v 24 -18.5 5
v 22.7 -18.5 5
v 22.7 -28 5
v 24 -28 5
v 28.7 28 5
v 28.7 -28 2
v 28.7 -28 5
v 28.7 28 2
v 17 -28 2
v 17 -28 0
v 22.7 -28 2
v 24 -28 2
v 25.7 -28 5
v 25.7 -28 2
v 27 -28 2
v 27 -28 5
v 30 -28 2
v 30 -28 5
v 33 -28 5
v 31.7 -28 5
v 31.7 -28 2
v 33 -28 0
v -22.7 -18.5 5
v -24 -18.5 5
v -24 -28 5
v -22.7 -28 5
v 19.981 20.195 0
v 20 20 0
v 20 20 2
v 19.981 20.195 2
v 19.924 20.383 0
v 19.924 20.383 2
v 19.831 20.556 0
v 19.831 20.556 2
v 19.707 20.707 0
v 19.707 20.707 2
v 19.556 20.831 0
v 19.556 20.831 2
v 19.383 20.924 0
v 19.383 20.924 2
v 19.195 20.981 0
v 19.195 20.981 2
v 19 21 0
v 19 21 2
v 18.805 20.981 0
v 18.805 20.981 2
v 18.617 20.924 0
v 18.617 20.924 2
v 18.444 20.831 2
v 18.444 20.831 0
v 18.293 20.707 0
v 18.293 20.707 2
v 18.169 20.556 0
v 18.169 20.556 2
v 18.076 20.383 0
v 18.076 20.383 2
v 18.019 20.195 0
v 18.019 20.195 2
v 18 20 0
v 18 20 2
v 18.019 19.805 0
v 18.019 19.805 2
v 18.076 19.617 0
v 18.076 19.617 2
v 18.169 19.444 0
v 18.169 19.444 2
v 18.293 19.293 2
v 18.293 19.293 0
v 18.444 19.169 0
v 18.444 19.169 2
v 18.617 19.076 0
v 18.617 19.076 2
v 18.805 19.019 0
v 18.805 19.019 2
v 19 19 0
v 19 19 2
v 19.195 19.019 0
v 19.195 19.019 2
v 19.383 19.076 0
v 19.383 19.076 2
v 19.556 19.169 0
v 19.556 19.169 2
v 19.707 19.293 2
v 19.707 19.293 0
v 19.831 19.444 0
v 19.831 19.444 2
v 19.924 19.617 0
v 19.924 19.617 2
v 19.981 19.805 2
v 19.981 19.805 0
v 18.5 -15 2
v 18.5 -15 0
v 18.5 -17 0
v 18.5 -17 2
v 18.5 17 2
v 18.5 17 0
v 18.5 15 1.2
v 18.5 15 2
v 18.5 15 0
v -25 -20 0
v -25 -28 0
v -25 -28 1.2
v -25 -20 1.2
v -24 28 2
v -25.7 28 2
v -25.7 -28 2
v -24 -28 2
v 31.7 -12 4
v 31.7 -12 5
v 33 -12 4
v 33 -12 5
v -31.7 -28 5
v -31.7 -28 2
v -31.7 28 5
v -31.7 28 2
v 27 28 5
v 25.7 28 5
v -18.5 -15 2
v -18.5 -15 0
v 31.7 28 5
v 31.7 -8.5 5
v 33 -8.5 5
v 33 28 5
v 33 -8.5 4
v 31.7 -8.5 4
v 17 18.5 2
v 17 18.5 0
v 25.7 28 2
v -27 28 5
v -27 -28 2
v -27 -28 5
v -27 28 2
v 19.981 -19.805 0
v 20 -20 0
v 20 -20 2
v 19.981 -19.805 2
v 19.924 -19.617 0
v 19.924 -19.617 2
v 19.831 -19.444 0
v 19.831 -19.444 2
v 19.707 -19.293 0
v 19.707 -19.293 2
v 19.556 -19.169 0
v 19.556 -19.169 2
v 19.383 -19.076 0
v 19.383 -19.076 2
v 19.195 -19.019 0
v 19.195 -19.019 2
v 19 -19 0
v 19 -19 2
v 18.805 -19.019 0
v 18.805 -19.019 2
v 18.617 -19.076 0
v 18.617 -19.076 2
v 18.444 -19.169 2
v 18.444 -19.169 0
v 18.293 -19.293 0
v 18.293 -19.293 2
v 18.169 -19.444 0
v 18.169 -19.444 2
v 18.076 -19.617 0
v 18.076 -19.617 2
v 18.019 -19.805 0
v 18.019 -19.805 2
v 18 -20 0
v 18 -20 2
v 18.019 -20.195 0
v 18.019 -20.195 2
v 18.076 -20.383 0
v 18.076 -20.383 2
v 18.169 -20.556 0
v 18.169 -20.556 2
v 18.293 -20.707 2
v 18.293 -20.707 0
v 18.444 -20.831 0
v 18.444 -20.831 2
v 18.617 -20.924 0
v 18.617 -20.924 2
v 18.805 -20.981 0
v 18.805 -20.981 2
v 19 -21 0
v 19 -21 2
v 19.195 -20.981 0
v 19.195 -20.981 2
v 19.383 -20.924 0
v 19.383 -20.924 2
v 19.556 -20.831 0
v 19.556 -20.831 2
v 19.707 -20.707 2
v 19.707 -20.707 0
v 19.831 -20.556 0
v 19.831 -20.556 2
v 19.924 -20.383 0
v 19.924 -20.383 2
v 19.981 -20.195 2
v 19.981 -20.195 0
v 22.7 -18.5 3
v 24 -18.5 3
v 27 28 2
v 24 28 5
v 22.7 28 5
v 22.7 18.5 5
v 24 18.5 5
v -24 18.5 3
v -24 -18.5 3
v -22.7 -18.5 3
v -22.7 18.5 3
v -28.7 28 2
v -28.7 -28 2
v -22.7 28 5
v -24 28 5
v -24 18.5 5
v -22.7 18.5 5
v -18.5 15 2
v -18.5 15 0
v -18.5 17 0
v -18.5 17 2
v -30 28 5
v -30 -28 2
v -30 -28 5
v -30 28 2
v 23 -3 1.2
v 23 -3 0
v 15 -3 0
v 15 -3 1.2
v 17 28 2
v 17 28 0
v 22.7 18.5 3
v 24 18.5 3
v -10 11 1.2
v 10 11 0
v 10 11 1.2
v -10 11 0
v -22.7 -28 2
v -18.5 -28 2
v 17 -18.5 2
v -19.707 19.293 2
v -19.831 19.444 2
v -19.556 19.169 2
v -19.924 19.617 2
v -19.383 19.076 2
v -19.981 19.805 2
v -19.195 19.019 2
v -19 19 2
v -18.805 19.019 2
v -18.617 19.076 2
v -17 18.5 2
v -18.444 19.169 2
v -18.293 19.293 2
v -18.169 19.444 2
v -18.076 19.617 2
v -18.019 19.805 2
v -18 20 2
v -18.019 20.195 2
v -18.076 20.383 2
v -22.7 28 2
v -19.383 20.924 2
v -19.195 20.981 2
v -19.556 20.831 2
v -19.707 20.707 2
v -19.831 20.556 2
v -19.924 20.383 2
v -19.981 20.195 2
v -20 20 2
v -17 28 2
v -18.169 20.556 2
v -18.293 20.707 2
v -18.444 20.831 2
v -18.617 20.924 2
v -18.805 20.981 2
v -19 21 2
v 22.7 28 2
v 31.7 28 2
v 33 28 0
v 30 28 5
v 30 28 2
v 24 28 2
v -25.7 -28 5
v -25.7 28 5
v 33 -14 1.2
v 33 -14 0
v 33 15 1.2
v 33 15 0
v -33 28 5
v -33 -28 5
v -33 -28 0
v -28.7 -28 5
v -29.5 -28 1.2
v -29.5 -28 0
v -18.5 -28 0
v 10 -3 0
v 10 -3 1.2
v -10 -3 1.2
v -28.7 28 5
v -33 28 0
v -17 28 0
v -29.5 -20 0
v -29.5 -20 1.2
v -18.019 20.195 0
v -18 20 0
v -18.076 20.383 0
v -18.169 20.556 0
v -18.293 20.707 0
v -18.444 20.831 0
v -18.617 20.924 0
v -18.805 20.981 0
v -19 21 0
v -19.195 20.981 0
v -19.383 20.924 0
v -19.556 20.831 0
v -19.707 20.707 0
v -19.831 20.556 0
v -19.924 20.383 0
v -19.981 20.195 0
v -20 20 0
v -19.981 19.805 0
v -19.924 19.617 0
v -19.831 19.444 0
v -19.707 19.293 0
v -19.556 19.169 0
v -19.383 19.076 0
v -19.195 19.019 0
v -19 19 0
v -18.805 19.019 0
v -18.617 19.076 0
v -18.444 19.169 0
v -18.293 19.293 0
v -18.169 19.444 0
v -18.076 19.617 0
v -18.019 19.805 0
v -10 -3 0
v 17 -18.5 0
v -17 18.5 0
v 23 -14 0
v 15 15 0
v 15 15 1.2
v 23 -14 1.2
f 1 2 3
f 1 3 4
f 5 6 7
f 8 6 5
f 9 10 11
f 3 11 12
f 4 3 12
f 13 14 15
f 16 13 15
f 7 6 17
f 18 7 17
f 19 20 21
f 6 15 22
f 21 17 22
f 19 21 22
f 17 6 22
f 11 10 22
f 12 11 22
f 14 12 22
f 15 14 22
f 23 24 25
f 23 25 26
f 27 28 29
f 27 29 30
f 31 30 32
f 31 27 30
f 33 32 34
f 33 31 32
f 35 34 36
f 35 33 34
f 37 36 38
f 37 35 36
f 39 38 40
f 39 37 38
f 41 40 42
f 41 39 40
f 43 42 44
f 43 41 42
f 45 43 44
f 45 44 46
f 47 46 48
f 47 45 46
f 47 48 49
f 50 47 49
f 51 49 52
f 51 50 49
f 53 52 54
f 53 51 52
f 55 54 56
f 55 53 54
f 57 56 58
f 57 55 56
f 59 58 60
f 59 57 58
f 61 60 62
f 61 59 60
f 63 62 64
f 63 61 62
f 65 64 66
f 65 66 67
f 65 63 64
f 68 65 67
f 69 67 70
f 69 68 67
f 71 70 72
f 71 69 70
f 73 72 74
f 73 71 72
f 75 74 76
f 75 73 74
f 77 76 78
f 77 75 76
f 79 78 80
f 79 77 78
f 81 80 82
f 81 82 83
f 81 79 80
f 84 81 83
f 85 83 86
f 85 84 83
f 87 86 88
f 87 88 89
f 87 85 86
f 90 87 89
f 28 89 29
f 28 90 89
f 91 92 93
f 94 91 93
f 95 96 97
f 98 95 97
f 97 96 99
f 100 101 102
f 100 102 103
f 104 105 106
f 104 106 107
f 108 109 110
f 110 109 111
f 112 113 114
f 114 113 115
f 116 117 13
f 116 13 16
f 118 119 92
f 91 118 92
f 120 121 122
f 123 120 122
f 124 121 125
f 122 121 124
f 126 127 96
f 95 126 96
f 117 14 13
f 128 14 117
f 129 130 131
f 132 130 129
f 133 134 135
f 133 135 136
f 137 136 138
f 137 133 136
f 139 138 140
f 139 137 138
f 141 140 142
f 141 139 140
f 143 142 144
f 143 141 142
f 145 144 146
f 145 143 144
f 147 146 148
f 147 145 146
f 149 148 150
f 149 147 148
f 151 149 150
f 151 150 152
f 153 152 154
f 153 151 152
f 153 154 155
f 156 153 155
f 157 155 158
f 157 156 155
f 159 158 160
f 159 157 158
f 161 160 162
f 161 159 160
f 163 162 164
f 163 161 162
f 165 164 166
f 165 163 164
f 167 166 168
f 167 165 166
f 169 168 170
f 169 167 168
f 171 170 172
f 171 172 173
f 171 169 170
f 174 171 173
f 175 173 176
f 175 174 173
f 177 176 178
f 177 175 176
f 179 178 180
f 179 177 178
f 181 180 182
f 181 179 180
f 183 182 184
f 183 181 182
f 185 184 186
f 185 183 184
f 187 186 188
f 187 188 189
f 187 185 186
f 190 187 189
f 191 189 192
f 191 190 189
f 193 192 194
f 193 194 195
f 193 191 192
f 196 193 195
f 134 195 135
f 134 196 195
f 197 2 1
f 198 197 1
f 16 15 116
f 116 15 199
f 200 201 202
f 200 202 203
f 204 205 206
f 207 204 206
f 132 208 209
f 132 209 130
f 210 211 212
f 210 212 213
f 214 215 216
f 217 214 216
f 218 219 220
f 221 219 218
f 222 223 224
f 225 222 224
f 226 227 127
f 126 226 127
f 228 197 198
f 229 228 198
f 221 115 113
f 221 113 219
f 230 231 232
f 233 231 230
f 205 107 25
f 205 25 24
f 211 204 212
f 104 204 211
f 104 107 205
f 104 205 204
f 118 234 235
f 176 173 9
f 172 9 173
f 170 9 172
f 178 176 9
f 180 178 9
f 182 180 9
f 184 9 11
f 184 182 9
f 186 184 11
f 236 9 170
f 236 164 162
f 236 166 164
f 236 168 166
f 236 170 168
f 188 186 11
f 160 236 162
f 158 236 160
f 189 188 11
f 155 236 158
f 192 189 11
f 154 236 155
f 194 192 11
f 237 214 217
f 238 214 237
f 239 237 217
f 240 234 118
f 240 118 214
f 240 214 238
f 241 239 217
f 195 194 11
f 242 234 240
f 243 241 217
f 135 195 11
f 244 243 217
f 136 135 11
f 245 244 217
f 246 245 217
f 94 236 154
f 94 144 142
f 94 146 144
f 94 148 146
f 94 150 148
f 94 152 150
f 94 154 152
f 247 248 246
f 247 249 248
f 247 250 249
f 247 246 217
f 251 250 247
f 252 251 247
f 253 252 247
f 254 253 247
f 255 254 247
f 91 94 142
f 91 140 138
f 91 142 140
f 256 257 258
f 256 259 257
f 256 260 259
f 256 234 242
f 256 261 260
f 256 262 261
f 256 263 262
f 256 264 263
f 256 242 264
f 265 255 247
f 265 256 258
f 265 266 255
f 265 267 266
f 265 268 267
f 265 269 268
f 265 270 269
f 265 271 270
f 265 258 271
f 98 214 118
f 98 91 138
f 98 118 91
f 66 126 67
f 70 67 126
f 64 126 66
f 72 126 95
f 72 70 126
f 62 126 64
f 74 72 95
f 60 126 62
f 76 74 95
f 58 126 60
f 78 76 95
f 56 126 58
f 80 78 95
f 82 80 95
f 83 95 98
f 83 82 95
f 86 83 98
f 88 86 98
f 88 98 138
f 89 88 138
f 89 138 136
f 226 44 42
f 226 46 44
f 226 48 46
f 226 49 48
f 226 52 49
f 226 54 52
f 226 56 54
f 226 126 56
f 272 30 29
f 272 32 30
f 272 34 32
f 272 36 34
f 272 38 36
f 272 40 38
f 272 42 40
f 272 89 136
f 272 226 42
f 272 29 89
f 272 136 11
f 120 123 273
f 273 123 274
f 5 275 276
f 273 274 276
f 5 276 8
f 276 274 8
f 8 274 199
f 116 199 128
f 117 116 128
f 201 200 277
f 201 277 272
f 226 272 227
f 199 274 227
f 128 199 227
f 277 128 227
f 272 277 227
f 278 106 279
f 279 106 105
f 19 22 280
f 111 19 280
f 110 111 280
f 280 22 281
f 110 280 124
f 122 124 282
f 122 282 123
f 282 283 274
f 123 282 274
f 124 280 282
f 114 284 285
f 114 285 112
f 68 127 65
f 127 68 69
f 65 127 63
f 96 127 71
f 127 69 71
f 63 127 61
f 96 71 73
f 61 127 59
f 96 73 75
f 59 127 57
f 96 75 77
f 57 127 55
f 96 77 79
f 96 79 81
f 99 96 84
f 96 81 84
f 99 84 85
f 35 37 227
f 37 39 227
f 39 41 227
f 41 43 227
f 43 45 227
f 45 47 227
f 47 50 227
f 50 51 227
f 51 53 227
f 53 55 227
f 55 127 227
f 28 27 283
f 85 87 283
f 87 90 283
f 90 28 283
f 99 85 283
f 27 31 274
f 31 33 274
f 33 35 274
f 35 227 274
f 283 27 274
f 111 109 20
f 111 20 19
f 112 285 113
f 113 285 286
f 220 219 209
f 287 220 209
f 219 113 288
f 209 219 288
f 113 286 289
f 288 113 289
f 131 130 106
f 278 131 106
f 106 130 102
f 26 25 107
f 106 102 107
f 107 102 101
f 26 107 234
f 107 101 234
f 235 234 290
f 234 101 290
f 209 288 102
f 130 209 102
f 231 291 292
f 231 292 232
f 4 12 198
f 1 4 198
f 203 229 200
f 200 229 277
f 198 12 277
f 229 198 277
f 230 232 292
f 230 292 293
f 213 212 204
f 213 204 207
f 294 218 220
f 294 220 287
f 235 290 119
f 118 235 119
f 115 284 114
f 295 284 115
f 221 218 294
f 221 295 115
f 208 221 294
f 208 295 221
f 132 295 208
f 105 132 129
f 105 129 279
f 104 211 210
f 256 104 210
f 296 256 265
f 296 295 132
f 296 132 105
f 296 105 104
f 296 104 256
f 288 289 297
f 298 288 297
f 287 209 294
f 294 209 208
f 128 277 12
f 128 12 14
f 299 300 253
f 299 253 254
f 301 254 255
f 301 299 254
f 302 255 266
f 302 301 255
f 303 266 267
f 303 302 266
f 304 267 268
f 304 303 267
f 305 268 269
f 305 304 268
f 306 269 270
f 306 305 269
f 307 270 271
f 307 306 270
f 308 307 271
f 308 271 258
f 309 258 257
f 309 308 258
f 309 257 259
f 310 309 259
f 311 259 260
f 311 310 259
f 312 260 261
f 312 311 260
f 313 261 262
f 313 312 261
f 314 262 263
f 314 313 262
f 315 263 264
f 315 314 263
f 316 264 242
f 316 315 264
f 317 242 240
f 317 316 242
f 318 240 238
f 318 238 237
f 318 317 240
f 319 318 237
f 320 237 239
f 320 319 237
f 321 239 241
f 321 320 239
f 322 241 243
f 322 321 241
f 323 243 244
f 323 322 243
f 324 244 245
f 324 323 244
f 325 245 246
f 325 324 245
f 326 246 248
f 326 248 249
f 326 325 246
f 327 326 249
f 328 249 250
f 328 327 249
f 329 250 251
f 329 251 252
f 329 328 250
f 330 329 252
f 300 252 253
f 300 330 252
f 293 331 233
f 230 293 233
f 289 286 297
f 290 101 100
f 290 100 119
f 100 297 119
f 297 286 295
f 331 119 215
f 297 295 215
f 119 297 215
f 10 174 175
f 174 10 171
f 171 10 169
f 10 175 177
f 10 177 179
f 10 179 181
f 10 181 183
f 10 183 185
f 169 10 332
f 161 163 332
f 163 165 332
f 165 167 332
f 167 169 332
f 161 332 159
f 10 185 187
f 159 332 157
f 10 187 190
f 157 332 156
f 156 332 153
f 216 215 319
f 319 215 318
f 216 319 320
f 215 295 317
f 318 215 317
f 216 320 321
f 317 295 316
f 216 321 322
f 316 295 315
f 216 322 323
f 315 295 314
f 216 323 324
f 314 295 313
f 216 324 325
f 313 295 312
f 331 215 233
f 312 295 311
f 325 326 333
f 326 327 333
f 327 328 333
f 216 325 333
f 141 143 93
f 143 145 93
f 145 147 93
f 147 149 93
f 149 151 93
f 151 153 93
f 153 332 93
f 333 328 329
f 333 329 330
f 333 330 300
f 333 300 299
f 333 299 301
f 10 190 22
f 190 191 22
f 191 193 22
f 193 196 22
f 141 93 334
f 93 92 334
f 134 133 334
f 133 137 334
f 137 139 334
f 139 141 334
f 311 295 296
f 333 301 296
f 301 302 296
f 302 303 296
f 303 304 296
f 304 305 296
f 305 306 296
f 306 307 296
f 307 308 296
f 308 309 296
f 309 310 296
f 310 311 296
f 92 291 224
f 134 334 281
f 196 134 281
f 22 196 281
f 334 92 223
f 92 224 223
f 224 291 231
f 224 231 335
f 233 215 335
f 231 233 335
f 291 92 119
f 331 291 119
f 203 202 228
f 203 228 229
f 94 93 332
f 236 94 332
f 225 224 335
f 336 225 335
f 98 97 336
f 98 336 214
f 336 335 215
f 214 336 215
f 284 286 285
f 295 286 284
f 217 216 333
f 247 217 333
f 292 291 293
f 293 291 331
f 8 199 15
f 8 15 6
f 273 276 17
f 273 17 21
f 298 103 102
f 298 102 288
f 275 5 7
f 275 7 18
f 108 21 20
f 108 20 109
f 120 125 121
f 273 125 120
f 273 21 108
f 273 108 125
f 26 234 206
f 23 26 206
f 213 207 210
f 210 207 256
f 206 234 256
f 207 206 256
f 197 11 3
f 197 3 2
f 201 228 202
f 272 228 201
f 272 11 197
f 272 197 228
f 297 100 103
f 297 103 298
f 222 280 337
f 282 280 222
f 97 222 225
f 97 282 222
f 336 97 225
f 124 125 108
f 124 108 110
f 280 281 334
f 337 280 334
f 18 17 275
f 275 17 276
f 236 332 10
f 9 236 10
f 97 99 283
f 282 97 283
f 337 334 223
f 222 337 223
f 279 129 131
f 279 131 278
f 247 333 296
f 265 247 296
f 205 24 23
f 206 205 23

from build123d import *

# Parameters (mm, degrees)
SKETCH_1_R          = 1
EXTRUDE_1_DEPTH     = 2
SKETCH_2_W          = 1.3
SKETCH_2_H          = 56
EXTRUDE_2_DEPTH     = 3
SKETCH_3_W          = 20
SKETCH_3_H          = 14
CUT_EXTRUDE_1_DEPTH = 1.2
SKETCH_6_W          = 4.5
SKETCH_6_H          = 8
CUT_EXTRUDE_4_DEPTH = 1.2
SKETCH_4_W          = 1.3
SKETCH_4_H          = 3.5
CUT_EXTRUDE_2_DEPTH = 1
SKETCH_5_W          = 48
SKETCH_5_H          = 37
CUT_EXTRUDE_3_DEPTH = 2


with BuildPart() as part:
    # 草图1 → 凸台-拉伸1 (new body)
    with BuildSketch(Plane.XY):
        Polygon((18.5, 15), (-18.5, 15), (-18.5, 17), (-17, 18.5), (-17, 28), (-33, 28), (-33, -28), (-18.5, -28), (-18.5, -17), (-18.5, -15), (18.5, -15), (18.5, -17), (17, -18.5), (17, -28), (33, -28), (33, 28), (17, 28), (17, 18.5), (18.5, 17), align=None)
        with Locations((19, -20)):
            Circle(SKETCH_1_R, mode=Mode.SUBTRACT)
        with Locations((-19, 20)):
            Circle(SKETCH_1_R, mode=Mode.SUBTRACT)
        with Locations((19, 20)):
            Circle(SKETCH_1_R, mode=Mode.SUBTRACT)
    extrude(amount=EXTRUDE_1_DEPTH)

    # 草图2 → 凸台-拉伸2 (add)
    with BuildSketch(Plane.XY.offset(2)):
        with Locations((-32.35, 0)):
            Rectangle(SKETCH_2_W, SKETCH_2_H)
        with Locations((32.35, 0)):
            Rectangle(SKETCH_2_W, SKETCH_2_H)
        with Locations((-29.35, 0)):
            Rectangle(SKETCH_2_W, SKETCH_2_H)
        with Locations((-26.35, 0)):
            Rectangle(SKETCH_2_W, SKETCH_2_H)
        with Locations((-23.35, 0)):
            Rectangle(SKETCH_2_W, SKETCH_2_H)
        with Locations((29.35, 0)):
            Rectangle(SKETCH_2_W, SKETCH_2_H)
        with Locations((26.35, 0)):
            Rectangle(SKETCH_2_W, SKETCH_2_H)
        with Locations((23.35, 0)):
            Rectangle(SKETCH_2_W, SKETCH_2_H)
    extrude(amount=EXTRUDE_2_DEPTH)

    # 草图3 → 切除-拉伸1 (cut)
    with BuildSketch(Plane(origin=(0, 0, 0), x_dir=(-1, 0, 0), z_dir=(0, 0, -1))):
        with Locations((0, 4)):
            Rectangle(SKETCH_3_W, SKETCH_3_H)
        Polygon((-15, -3), (-15, 15), (-33, 15), (-33, -14), (-23, -14), (-23, -3), align=None)
    extrude(amount=-CUT_EXTRUDE_1_DEPTH, mode=Mode.SUBTRACT)

    # 草图6 → 切除-拉伸4 (cut)
    with BuildSketch(Plane(origin=(0, 0, 0), x_dir=(-1, 0, 0), z_dir=(0, 0, -1))):
        with Locations((27.25, -24)):
            Rectangle(SKETCH_6_W, SKETCH_6_H)
    extrude(amount=-CUT_EXTRUDE_4_DEPTH, mode=Mode.SUBTRACT)

    # 草图4 → 切除-拉伸2 (cut)
    with BuildSketch(Plane.XY.offset(5)):
        with Locations((32.35, -10.25)):
            Rectangle(SKETCH_4_W, SKETCH_4_H)
    extrude(amount=-CUT_EXTRUDE_2_DEPTH, mode=Mode.SUBTRACT)

    # 草图5 → 切除-拉伸3 (cut)
    with BuildSketch(Plane.XY.offset(5)):
        Rectangle(SKETCH_5_W, SKETCH_5_H)
    extrude(amount=-CUT_EXTRUDE_3_DEPTH, mode=Mode.SUBTRACT)


solid = part.part
